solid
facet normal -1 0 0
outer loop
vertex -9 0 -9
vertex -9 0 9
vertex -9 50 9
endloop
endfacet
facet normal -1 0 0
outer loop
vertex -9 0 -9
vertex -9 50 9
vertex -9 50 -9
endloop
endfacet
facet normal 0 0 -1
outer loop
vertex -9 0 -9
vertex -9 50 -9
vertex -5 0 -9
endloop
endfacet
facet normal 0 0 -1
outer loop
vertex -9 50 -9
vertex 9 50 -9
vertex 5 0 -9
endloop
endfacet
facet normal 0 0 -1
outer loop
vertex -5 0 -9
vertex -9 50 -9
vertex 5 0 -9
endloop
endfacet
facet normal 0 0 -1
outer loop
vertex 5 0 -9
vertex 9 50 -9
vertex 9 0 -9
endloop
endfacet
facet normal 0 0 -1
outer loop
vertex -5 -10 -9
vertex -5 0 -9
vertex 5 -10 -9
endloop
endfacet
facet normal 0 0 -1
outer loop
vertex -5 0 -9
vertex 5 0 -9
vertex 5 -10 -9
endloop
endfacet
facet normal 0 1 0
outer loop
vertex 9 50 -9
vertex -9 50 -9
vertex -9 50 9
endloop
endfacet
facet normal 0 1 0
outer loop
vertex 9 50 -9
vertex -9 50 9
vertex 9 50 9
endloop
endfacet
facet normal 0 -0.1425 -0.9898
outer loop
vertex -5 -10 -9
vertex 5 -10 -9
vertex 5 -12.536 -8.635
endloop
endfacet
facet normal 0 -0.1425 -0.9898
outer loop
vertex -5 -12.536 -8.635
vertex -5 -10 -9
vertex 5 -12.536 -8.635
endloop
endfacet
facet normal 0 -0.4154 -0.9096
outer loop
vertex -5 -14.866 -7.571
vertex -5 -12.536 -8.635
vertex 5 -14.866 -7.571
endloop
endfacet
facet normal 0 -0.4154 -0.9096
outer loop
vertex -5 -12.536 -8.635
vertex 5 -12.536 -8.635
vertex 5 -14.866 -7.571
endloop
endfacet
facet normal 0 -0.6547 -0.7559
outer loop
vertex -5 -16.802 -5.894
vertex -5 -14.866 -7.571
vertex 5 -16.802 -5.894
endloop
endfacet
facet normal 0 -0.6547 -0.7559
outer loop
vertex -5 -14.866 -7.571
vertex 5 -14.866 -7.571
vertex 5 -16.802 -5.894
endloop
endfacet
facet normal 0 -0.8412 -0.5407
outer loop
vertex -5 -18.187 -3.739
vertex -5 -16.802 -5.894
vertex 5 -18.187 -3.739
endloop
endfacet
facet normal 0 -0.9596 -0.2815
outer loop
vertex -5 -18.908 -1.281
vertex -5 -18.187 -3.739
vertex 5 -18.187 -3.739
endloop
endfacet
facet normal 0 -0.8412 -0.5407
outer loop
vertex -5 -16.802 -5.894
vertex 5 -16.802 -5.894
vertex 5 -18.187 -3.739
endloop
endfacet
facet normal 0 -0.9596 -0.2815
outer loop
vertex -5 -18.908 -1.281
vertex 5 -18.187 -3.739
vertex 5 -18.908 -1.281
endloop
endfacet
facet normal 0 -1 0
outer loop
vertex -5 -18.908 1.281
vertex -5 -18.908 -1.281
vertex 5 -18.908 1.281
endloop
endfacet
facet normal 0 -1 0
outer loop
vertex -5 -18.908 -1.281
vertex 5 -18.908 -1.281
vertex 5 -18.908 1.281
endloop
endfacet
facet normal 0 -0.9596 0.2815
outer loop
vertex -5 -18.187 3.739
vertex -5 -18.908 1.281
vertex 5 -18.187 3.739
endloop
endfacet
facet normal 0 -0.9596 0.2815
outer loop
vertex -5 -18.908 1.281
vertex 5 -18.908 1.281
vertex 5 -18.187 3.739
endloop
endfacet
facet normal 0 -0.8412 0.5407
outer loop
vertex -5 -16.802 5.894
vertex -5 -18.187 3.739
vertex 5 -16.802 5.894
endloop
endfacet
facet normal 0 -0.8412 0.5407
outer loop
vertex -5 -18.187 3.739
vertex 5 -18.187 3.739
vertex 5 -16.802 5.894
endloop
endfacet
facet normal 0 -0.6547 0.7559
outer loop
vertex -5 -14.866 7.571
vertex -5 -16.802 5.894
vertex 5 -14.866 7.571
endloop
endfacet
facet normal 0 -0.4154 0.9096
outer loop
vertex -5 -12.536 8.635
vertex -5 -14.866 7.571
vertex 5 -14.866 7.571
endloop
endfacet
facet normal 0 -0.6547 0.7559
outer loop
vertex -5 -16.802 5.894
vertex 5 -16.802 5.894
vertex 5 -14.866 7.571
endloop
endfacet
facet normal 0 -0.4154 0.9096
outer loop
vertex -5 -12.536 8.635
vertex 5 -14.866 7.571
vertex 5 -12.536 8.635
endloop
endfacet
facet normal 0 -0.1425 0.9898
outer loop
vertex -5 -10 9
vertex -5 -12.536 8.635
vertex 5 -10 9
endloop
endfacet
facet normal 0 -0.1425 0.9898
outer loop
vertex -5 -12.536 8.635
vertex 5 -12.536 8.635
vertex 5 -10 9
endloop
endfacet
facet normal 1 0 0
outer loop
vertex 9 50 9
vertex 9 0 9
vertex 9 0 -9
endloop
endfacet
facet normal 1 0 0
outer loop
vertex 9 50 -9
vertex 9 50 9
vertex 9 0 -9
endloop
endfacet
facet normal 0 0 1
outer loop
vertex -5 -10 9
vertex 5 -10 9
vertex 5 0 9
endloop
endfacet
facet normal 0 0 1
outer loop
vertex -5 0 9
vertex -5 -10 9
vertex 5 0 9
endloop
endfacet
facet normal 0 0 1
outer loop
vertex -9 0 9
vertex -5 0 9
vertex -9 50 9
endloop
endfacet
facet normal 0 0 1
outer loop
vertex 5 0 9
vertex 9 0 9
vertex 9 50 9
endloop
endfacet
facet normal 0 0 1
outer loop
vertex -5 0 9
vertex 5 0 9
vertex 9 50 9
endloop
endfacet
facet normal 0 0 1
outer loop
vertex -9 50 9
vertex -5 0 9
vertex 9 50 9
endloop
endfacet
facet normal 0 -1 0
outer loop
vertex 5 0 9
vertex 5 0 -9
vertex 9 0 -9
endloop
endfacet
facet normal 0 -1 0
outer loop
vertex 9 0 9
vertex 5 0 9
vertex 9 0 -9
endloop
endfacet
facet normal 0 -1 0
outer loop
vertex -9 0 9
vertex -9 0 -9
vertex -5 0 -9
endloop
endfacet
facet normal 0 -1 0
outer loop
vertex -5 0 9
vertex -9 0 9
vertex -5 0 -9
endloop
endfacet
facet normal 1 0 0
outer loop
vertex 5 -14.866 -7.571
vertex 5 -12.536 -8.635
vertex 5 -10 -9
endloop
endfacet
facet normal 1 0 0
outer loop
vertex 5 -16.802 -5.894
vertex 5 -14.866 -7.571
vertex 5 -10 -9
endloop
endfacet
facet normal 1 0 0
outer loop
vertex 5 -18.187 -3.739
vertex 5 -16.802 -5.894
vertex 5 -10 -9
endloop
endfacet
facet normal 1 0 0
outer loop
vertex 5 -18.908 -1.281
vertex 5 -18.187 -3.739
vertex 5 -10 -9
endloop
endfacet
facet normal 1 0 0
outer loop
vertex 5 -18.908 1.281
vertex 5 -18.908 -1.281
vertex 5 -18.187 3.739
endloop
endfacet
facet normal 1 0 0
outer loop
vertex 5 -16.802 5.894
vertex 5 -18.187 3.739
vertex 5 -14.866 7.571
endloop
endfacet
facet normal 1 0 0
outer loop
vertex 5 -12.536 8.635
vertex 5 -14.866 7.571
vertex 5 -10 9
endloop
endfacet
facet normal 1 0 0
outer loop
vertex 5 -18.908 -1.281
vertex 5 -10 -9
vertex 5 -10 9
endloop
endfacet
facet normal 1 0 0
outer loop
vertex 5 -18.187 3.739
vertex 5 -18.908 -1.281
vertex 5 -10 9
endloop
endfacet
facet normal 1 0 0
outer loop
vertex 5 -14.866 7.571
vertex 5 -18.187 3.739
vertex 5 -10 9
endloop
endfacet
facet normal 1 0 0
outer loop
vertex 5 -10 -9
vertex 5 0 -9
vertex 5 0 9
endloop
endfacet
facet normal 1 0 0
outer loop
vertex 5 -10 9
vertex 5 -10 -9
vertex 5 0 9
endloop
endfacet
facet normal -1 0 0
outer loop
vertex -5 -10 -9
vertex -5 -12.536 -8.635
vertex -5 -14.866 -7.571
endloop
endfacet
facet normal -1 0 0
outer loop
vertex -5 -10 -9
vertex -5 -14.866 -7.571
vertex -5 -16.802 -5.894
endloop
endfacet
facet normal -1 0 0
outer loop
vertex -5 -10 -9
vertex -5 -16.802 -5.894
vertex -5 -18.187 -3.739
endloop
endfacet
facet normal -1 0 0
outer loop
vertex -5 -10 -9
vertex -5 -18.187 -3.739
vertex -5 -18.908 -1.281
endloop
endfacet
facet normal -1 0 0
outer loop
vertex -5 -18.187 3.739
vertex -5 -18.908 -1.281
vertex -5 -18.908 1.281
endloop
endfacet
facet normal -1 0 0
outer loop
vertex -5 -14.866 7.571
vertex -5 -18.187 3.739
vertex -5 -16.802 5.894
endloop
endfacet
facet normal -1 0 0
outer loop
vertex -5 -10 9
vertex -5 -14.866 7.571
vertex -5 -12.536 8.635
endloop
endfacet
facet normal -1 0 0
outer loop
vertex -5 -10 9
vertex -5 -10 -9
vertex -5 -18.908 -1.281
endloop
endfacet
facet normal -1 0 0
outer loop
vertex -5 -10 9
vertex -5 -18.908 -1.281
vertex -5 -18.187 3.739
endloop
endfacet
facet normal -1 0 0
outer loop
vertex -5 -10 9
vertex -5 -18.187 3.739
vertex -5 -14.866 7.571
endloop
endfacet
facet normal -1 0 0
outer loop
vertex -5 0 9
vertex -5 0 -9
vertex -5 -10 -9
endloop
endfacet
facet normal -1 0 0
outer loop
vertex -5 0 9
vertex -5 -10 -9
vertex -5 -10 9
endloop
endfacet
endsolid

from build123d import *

# Parameters (mm, degrees)
SKETCH_1_W      = 18
SKETCH_1_H      = 18
EXTRUDE_1_DEPTH = 50
EXTRUDE_2_DEPTH = 5


with BuildPart() as part:
    # 草图1 → 凸台-拉伸1 (new body)
    with BuildSketch(Plane(origin=(0, 0, 0), x_dir=(1, 0, 0), z_dir=(0, 1, 0))):
        Rectangle(SKETCH_1_W, SKETCH_1_H)
    extrude(amount=EXTRUDE_1_DEPTH)

    # 草图2 → 凸台-拉伸2 (add, symmetric)
    with BuildSketch(Plane(origin=(0, 0, 0), x_dir=(0, 0, -1), z_dir=(1, 0, 0))):
        with BuildLine():
            Line((-9, -10), (-9, 1.037830192))
            Line((-9, 1.037830192), (9, 1.037830192))
            Line((9, 1.037830192), (9, -10))
            ThreePointArc((9, -10), (0, -19), (-9, -10))
        make_face()
    extrude(amount=EXTRUDE_2_DEPTH, both=True)


solid = part.part
